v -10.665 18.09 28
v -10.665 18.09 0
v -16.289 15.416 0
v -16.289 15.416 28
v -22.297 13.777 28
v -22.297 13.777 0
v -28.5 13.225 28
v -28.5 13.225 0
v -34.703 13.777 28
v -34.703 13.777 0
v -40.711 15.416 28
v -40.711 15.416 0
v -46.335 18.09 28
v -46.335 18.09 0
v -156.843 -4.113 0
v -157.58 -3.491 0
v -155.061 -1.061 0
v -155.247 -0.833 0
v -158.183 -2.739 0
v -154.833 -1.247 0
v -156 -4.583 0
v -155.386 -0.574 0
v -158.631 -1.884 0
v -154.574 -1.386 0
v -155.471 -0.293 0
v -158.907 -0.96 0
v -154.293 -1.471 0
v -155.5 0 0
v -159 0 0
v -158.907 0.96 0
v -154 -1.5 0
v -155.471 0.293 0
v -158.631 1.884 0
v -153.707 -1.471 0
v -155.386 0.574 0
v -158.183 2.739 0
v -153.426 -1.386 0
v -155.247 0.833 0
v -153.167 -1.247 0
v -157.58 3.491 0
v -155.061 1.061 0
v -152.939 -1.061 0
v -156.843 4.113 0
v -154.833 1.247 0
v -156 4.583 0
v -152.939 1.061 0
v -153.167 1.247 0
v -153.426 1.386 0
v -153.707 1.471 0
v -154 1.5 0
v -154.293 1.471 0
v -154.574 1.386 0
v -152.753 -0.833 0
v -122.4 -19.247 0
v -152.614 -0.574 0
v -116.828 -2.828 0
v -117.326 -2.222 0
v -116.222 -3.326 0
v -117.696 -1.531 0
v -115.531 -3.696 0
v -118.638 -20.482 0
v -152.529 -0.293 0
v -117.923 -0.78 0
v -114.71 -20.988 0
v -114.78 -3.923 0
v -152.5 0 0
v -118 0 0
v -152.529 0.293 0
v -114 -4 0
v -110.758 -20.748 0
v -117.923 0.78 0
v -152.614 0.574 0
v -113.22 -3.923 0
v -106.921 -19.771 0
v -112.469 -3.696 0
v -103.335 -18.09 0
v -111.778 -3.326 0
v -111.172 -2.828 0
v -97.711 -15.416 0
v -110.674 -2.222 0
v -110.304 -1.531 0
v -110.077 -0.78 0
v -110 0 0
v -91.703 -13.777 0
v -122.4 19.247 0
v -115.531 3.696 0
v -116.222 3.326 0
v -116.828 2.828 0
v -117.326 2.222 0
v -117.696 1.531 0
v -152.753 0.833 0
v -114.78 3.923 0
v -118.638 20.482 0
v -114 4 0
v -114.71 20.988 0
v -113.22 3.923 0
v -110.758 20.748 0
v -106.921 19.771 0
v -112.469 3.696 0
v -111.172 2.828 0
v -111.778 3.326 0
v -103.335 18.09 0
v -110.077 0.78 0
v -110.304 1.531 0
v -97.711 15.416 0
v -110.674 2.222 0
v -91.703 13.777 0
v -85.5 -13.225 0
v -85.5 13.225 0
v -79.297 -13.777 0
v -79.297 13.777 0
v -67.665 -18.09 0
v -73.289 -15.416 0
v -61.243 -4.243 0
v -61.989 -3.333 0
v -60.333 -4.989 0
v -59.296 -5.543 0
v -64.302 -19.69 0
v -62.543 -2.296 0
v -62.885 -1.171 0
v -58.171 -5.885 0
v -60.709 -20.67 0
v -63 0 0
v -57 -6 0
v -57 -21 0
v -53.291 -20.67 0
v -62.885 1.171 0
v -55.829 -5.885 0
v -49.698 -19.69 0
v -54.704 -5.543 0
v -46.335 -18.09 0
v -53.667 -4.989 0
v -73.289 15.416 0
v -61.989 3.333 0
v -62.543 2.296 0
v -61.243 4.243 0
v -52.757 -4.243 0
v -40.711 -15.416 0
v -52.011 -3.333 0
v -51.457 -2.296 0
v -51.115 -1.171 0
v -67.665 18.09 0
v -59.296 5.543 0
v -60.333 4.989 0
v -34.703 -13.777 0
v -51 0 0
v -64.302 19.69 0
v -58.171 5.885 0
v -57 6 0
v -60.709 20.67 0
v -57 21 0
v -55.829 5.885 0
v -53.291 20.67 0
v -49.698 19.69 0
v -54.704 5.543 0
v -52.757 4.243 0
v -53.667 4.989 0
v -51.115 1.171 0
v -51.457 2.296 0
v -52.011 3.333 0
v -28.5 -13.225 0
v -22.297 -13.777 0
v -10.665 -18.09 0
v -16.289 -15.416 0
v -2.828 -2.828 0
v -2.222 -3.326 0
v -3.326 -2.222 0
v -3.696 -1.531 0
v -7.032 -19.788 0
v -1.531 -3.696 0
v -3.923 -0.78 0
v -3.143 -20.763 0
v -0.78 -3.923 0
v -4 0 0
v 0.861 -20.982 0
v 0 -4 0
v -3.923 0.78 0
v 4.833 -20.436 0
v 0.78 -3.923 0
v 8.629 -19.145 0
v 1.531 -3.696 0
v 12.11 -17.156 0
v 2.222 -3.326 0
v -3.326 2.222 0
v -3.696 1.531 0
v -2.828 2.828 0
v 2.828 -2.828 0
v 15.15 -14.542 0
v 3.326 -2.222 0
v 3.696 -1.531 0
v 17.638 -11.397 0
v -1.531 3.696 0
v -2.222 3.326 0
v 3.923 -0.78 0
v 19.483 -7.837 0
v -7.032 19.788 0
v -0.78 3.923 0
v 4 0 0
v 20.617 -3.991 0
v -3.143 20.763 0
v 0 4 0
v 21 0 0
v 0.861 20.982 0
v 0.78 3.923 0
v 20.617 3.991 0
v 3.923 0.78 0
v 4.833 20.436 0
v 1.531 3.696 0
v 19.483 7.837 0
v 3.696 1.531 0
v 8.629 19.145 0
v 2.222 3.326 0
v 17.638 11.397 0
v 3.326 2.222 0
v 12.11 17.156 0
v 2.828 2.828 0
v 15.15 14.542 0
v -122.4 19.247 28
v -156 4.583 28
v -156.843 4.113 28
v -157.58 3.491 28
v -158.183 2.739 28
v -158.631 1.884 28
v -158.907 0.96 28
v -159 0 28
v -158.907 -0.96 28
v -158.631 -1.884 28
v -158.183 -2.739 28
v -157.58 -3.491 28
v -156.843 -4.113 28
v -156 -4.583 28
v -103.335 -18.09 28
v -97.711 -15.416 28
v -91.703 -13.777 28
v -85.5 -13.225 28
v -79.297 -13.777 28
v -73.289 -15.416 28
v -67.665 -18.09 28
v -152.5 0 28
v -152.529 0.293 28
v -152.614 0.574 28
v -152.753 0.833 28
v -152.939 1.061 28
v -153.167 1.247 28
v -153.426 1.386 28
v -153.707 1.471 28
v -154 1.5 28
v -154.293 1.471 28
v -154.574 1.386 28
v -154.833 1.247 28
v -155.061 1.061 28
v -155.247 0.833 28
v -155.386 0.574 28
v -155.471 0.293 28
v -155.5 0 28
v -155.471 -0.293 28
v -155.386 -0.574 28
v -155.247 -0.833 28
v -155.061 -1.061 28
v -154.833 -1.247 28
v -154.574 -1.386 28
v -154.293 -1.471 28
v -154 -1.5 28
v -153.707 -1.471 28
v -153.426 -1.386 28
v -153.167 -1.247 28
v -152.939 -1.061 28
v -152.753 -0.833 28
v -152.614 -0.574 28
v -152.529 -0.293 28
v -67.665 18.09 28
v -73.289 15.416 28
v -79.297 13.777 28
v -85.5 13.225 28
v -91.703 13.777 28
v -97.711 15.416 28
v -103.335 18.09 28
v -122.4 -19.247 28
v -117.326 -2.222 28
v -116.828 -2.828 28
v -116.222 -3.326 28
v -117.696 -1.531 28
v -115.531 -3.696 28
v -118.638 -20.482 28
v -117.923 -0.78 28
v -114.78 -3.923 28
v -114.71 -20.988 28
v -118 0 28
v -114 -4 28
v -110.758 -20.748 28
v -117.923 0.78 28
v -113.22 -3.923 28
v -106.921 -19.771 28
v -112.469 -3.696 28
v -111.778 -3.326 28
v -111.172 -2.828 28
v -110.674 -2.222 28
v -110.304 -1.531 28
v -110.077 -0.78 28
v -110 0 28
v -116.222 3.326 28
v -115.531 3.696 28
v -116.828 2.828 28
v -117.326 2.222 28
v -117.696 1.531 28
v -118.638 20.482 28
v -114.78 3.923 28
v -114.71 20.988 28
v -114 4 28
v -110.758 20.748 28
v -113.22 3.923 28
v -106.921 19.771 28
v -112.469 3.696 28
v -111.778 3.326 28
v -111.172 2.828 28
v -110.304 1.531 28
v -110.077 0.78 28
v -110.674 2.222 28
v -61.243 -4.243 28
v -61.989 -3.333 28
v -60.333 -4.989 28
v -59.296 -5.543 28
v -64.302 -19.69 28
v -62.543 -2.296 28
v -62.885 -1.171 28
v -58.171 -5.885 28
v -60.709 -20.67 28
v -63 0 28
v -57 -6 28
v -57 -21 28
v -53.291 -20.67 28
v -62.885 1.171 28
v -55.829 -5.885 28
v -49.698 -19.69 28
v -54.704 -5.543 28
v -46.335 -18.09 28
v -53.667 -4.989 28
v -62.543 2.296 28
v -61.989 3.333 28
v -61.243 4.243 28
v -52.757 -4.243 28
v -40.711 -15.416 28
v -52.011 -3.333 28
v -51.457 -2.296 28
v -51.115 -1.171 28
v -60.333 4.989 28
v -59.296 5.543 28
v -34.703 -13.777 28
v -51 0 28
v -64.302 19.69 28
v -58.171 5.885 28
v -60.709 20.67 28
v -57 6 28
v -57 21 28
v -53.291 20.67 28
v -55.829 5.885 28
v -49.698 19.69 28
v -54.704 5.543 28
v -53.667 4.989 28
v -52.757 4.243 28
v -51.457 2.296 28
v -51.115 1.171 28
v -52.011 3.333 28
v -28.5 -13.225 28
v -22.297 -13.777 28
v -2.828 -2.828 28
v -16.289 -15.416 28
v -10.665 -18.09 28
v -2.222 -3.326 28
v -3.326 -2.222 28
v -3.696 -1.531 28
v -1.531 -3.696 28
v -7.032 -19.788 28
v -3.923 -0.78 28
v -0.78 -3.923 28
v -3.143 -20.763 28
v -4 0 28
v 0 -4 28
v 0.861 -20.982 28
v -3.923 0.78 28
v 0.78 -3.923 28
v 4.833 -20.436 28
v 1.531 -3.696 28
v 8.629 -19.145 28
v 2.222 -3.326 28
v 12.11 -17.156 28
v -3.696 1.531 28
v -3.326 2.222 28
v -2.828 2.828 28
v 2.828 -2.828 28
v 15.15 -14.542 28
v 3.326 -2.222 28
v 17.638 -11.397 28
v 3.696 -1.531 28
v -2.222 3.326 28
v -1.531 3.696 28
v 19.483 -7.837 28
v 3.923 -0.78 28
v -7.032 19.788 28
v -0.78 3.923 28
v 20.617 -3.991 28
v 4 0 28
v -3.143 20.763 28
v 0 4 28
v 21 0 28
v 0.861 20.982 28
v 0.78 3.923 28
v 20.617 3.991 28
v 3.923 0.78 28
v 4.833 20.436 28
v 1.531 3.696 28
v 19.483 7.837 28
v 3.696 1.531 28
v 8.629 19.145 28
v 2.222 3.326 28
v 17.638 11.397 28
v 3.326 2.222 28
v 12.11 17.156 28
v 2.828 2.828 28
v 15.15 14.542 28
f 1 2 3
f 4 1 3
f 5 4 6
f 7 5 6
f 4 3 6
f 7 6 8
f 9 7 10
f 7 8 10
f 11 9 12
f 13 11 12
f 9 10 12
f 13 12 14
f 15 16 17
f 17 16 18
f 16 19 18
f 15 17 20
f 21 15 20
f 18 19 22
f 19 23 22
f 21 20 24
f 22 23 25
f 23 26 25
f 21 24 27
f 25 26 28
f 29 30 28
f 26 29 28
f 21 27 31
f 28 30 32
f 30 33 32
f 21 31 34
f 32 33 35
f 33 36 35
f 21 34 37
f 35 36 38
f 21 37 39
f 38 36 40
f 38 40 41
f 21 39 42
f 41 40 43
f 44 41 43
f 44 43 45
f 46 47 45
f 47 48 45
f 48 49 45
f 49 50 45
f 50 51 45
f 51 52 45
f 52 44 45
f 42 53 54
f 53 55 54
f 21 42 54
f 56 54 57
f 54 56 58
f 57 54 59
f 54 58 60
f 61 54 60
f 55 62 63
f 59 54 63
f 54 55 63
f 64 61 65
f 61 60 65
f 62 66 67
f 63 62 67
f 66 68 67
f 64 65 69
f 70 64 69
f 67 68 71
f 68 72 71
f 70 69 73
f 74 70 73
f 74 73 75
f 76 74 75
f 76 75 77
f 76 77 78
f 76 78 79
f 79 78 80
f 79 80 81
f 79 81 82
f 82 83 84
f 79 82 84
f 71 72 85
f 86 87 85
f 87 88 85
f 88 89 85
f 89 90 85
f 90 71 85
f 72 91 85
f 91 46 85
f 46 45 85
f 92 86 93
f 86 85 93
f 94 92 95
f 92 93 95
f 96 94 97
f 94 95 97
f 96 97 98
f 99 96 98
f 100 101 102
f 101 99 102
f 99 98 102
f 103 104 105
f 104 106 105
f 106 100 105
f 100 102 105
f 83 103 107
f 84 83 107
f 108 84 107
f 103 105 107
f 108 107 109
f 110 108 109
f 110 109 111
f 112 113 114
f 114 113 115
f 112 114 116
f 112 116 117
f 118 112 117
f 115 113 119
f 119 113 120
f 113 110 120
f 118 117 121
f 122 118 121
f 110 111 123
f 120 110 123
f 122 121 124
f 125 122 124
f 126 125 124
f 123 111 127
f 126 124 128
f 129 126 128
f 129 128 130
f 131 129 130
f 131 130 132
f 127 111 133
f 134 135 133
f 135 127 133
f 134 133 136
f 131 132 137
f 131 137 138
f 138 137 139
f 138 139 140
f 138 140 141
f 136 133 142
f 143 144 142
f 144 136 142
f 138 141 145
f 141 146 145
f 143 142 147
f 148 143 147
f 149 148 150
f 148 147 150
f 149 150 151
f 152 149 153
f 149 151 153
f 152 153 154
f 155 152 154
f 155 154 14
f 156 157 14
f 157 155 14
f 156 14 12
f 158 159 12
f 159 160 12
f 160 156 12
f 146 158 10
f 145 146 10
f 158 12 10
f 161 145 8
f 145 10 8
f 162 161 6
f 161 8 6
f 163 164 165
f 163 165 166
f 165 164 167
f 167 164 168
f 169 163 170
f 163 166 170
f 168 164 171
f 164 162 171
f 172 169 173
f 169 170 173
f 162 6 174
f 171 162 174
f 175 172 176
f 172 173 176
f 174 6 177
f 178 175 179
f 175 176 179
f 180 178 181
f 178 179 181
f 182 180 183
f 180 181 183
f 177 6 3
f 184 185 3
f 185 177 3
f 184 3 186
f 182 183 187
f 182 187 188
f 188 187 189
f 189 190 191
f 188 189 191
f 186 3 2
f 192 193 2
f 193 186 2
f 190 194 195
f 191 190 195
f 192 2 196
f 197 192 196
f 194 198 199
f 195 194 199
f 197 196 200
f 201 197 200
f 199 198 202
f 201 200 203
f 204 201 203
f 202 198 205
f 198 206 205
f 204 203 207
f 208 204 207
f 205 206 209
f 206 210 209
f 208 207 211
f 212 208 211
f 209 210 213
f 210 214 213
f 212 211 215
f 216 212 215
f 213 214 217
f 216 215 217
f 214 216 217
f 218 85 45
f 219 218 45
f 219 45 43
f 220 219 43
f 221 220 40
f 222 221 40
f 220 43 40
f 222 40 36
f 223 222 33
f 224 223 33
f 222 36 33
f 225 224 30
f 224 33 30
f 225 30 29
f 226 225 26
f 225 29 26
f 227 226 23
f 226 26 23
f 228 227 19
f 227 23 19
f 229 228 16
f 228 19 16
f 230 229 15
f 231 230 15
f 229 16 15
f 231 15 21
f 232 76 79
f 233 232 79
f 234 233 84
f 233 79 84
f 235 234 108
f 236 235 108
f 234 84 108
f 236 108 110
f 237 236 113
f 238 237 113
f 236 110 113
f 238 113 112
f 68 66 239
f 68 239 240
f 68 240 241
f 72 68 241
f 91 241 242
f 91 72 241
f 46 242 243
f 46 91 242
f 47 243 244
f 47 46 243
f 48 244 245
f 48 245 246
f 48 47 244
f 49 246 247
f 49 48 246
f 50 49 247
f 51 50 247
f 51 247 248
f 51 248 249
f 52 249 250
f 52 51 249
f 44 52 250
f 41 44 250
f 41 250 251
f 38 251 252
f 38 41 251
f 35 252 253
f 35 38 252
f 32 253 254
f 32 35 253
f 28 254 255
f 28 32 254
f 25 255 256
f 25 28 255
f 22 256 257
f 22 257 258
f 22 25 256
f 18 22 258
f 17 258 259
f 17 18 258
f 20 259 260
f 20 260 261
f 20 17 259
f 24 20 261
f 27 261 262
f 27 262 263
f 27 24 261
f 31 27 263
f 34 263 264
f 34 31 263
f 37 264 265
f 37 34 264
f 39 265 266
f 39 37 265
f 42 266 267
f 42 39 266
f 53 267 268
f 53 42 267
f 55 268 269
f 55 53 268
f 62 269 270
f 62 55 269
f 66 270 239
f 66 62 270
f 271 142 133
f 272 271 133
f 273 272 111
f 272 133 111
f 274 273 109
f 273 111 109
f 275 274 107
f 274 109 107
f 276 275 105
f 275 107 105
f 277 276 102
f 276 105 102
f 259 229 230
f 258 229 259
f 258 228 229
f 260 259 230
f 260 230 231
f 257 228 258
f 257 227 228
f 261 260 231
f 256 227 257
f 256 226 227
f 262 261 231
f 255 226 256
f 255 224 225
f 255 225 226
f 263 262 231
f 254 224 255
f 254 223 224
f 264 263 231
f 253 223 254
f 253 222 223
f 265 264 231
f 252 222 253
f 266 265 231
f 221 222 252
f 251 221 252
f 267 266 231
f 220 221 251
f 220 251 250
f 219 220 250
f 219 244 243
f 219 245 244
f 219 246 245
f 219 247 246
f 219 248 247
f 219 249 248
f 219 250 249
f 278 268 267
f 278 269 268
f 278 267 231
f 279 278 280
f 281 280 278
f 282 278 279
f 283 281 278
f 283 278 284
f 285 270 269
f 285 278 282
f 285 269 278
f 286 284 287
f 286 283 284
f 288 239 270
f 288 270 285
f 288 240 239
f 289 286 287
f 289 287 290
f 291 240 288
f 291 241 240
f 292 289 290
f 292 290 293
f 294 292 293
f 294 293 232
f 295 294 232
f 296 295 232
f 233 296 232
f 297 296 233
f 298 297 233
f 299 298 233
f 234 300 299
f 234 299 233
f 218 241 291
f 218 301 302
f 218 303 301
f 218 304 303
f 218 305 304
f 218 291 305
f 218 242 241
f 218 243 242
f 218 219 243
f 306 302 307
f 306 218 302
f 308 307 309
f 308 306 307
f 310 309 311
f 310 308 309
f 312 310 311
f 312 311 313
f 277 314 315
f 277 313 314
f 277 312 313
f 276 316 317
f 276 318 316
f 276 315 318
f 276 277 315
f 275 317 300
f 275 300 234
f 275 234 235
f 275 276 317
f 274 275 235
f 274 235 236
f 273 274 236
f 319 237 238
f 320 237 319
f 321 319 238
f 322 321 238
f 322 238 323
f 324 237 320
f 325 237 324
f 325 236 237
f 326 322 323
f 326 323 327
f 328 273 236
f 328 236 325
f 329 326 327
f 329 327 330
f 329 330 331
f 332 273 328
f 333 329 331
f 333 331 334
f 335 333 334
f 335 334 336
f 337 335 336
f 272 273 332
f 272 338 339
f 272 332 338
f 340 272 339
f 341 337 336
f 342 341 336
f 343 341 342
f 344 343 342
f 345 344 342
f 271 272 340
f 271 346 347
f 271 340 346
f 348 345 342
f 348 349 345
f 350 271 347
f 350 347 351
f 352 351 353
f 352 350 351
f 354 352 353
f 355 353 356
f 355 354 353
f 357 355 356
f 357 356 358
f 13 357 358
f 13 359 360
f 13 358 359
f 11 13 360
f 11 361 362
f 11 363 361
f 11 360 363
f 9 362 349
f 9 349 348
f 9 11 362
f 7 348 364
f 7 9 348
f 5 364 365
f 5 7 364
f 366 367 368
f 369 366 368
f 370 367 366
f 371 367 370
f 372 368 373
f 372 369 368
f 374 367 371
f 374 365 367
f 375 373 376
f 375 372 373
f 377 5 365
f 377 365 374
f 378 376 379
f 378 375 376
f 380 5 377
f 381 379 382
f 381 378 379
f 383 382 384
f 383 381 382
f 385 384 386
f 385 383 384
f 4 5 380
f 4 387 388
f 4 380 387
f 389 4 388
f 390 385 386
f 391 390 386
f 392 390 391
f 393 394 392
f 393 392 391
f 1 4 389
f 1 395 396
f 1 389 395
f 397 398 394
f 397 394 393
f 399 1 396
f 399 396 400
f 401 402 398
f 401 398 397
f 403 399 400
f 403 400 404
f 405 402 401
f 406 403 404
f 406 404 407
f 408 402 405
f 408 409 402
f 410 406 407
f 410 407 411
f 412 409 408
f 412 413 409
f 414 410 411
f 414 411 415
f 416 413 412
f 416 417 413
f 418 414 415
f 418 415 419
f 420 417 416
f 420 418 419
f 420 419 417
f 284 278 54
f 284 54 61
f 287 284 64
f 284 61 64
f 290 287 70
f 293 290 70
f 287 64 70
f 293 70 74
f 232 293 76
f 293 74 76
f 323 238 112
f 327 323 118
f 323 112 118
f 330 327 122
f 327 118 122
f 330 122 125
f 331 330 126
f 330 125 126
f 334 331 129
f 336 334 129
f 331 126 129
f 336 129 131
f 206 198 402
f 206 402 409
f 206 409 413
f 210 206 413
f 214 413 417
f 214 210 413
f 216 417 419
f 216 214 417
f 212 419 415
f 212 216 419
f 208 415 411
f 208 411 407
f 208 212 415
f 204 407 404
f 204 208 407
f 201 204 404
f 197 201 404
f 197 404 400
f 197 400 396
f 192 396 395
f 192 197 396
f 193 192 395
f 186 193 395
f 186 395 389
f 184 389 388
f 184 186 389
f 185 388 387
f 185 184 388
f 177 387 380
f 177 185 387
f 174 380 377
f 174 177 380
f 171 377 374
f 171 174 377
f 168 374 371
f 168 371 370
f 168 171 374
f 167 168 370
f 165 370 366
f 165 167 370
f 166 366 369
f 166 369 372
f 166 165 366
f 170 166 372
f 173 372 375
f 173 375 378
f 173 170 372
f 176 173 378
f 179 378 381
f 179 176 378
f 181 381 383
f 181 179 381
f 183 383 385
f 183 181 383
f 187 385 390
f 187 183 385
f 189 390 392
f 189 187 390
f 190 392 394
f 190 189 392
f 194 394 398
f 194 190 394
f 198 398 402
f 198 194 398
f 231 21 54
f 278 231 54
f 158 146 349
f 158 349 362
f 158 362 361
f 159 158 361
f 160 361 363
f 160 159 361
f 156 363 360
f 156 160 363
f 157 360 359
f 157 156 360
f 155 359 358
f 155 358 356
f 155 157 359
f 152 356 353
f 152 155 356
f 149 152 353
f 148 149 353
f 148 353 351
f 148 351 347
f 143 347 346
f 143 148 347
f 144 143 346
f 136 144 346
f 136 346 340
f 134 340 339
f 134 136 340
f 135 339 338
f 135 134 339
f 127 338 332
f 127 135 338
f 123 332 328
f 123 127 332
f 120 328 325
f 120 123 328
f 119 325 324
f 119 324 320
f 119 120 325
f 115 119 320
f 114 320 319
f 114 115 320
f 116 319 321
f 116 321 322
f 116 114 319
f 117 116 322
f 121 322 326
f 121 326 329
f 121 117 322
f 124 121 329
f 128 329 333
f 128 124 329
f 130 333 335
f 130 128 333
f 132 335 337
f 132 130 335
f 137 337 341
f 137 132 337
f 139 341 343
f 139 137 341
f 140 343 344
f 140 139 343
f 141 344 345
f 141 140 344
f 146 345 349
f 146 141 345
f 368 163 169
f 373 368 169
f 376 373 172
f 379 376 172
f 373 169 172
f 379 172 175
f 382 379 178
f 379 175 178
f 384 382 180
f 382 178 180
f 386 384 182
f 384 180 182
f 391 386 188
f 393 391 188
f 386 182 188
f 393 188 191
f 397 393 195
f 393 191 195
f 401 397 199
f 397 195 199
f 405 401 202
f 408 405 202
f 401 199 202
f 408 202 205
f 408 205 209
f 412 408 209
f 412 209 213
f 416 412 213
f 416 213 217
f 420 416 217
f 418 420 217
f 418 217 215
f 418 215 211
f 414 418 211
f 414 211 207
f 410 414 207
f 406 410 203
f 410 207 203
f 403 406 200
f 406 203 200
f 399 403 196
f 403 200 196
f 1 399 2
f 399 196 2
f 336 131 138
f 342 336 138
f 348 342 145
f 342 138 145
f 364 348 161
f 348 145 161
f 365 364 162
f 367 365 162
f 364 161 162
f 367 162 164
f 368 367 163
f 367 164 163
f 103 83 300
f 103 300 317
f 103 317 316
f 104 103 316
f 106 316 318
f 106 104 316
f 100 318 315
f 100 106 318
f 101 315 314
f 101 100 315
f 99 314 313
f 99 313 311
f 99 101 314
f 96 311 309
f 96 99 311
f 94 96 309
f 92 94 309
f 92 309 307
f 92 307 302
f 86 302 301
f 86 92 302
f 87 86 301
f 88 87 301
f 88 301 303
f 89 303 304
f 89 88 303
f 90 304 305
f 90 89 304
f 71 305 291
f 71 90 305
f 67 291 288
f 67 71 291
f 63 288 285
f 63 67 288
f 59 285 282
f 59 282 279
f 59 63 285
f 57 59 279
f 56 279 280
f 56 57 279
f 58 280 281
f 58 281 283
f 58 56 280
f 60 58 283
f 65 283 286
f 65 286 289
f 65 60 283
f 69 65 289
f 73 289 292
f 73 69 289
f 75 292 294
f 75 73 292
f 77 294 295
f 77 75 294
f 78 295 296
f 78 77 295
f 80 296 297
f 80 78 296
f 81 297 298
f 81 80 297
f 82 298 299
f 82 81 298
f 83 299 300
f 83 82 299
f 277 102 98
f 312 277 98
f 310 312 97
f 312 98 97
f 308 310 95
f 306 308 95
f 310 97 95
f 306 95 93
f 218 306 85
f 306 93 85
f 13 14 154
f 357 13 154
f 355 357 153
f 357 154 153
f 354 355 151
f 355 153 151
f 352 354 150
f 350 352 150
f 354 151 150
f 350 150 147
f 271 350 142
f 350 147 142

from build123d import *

# Parameters (mm, degrees)
F0_R     = 1.5
F0_R_2   = 4
F0_R_3   = 6
F1_DEPTH = 28


# Not quite as in the source:
# - ends of sketch curves that miss each other by under 0.0002 mm in the source are joined


with BuildPart() as f1:
    # F0 (on Top) → F1 (new body)
    with BuildSketch(Plane.XY):
        with BuildLine():
            ThreePointArc((-46.3352200183, -18.0903971195), (-28.5000011764, -13.2245283483), (-10.6647820085, -18.0903959247))
            ThreePointArc((-10.6647820085, -18.0903959247), (21, 0), (-10.6647820085, 18.0903959247))
            ThreePointArc((-10.6647820085, 18.0903959247), (-28.5000011764, 13.2245283483), (-46.3352200183, 18.0903971195))
            ThreePointArc((-46.3352200183, 18.0903971195), (-57.0000007926, 21), (-67.6647813473, 18.0903963145))
            ThreePointArc((-67.6647813473, 18.0903963145), (-85.5000011764, 13.2245283483), (-103.3352200183, 18.0903971195))
            ThreePointArc((-103.3352200183, 18.0903971195), (-112.7285298393, 20.9614733173), (-122.4, 19.2468179188))
            Line((-122.4, 19.2468179188), (-156, 4.582575695))
            ThreePointArc((-156, 4.582575695), (-159, 0), (-156, -4.582575695))
            Line((-156, -4.582575695), (-122.4, -19.2468179188))
            ThreePointArc((-122.4, -19.2468179188), (-112.7285306305, -20.9614733653), (-103.3352200183, -18.0903971195))
            ThreePointArc((-103.3352200183, -18.0903971195), (-85.5000011764, -13.2245283483), (-67.6647820085, -18.0903959247))
            ThreePointArc((-67.6647820085, -18.0903959247), (-57.0000011764, -21), (-46.3352200183, -18.0903971195))
        make_face()
        with Locations((-154, 0)):
            Circle(F0_R, mode=Mode.SUBTRACT)
        with Locations((-114, 0)):
            Circle(F0_R_2, mode=Mode.SUBTRACT)
        with Locations((-57, 0)):
            Circle(F0_R_3, mode=Mode.SUBTRACT)
        Circle(F0_R_2, mode=Mode.SUBTRACT)
    extrude(amount=F1_DEPTH)


solid = f1.part
